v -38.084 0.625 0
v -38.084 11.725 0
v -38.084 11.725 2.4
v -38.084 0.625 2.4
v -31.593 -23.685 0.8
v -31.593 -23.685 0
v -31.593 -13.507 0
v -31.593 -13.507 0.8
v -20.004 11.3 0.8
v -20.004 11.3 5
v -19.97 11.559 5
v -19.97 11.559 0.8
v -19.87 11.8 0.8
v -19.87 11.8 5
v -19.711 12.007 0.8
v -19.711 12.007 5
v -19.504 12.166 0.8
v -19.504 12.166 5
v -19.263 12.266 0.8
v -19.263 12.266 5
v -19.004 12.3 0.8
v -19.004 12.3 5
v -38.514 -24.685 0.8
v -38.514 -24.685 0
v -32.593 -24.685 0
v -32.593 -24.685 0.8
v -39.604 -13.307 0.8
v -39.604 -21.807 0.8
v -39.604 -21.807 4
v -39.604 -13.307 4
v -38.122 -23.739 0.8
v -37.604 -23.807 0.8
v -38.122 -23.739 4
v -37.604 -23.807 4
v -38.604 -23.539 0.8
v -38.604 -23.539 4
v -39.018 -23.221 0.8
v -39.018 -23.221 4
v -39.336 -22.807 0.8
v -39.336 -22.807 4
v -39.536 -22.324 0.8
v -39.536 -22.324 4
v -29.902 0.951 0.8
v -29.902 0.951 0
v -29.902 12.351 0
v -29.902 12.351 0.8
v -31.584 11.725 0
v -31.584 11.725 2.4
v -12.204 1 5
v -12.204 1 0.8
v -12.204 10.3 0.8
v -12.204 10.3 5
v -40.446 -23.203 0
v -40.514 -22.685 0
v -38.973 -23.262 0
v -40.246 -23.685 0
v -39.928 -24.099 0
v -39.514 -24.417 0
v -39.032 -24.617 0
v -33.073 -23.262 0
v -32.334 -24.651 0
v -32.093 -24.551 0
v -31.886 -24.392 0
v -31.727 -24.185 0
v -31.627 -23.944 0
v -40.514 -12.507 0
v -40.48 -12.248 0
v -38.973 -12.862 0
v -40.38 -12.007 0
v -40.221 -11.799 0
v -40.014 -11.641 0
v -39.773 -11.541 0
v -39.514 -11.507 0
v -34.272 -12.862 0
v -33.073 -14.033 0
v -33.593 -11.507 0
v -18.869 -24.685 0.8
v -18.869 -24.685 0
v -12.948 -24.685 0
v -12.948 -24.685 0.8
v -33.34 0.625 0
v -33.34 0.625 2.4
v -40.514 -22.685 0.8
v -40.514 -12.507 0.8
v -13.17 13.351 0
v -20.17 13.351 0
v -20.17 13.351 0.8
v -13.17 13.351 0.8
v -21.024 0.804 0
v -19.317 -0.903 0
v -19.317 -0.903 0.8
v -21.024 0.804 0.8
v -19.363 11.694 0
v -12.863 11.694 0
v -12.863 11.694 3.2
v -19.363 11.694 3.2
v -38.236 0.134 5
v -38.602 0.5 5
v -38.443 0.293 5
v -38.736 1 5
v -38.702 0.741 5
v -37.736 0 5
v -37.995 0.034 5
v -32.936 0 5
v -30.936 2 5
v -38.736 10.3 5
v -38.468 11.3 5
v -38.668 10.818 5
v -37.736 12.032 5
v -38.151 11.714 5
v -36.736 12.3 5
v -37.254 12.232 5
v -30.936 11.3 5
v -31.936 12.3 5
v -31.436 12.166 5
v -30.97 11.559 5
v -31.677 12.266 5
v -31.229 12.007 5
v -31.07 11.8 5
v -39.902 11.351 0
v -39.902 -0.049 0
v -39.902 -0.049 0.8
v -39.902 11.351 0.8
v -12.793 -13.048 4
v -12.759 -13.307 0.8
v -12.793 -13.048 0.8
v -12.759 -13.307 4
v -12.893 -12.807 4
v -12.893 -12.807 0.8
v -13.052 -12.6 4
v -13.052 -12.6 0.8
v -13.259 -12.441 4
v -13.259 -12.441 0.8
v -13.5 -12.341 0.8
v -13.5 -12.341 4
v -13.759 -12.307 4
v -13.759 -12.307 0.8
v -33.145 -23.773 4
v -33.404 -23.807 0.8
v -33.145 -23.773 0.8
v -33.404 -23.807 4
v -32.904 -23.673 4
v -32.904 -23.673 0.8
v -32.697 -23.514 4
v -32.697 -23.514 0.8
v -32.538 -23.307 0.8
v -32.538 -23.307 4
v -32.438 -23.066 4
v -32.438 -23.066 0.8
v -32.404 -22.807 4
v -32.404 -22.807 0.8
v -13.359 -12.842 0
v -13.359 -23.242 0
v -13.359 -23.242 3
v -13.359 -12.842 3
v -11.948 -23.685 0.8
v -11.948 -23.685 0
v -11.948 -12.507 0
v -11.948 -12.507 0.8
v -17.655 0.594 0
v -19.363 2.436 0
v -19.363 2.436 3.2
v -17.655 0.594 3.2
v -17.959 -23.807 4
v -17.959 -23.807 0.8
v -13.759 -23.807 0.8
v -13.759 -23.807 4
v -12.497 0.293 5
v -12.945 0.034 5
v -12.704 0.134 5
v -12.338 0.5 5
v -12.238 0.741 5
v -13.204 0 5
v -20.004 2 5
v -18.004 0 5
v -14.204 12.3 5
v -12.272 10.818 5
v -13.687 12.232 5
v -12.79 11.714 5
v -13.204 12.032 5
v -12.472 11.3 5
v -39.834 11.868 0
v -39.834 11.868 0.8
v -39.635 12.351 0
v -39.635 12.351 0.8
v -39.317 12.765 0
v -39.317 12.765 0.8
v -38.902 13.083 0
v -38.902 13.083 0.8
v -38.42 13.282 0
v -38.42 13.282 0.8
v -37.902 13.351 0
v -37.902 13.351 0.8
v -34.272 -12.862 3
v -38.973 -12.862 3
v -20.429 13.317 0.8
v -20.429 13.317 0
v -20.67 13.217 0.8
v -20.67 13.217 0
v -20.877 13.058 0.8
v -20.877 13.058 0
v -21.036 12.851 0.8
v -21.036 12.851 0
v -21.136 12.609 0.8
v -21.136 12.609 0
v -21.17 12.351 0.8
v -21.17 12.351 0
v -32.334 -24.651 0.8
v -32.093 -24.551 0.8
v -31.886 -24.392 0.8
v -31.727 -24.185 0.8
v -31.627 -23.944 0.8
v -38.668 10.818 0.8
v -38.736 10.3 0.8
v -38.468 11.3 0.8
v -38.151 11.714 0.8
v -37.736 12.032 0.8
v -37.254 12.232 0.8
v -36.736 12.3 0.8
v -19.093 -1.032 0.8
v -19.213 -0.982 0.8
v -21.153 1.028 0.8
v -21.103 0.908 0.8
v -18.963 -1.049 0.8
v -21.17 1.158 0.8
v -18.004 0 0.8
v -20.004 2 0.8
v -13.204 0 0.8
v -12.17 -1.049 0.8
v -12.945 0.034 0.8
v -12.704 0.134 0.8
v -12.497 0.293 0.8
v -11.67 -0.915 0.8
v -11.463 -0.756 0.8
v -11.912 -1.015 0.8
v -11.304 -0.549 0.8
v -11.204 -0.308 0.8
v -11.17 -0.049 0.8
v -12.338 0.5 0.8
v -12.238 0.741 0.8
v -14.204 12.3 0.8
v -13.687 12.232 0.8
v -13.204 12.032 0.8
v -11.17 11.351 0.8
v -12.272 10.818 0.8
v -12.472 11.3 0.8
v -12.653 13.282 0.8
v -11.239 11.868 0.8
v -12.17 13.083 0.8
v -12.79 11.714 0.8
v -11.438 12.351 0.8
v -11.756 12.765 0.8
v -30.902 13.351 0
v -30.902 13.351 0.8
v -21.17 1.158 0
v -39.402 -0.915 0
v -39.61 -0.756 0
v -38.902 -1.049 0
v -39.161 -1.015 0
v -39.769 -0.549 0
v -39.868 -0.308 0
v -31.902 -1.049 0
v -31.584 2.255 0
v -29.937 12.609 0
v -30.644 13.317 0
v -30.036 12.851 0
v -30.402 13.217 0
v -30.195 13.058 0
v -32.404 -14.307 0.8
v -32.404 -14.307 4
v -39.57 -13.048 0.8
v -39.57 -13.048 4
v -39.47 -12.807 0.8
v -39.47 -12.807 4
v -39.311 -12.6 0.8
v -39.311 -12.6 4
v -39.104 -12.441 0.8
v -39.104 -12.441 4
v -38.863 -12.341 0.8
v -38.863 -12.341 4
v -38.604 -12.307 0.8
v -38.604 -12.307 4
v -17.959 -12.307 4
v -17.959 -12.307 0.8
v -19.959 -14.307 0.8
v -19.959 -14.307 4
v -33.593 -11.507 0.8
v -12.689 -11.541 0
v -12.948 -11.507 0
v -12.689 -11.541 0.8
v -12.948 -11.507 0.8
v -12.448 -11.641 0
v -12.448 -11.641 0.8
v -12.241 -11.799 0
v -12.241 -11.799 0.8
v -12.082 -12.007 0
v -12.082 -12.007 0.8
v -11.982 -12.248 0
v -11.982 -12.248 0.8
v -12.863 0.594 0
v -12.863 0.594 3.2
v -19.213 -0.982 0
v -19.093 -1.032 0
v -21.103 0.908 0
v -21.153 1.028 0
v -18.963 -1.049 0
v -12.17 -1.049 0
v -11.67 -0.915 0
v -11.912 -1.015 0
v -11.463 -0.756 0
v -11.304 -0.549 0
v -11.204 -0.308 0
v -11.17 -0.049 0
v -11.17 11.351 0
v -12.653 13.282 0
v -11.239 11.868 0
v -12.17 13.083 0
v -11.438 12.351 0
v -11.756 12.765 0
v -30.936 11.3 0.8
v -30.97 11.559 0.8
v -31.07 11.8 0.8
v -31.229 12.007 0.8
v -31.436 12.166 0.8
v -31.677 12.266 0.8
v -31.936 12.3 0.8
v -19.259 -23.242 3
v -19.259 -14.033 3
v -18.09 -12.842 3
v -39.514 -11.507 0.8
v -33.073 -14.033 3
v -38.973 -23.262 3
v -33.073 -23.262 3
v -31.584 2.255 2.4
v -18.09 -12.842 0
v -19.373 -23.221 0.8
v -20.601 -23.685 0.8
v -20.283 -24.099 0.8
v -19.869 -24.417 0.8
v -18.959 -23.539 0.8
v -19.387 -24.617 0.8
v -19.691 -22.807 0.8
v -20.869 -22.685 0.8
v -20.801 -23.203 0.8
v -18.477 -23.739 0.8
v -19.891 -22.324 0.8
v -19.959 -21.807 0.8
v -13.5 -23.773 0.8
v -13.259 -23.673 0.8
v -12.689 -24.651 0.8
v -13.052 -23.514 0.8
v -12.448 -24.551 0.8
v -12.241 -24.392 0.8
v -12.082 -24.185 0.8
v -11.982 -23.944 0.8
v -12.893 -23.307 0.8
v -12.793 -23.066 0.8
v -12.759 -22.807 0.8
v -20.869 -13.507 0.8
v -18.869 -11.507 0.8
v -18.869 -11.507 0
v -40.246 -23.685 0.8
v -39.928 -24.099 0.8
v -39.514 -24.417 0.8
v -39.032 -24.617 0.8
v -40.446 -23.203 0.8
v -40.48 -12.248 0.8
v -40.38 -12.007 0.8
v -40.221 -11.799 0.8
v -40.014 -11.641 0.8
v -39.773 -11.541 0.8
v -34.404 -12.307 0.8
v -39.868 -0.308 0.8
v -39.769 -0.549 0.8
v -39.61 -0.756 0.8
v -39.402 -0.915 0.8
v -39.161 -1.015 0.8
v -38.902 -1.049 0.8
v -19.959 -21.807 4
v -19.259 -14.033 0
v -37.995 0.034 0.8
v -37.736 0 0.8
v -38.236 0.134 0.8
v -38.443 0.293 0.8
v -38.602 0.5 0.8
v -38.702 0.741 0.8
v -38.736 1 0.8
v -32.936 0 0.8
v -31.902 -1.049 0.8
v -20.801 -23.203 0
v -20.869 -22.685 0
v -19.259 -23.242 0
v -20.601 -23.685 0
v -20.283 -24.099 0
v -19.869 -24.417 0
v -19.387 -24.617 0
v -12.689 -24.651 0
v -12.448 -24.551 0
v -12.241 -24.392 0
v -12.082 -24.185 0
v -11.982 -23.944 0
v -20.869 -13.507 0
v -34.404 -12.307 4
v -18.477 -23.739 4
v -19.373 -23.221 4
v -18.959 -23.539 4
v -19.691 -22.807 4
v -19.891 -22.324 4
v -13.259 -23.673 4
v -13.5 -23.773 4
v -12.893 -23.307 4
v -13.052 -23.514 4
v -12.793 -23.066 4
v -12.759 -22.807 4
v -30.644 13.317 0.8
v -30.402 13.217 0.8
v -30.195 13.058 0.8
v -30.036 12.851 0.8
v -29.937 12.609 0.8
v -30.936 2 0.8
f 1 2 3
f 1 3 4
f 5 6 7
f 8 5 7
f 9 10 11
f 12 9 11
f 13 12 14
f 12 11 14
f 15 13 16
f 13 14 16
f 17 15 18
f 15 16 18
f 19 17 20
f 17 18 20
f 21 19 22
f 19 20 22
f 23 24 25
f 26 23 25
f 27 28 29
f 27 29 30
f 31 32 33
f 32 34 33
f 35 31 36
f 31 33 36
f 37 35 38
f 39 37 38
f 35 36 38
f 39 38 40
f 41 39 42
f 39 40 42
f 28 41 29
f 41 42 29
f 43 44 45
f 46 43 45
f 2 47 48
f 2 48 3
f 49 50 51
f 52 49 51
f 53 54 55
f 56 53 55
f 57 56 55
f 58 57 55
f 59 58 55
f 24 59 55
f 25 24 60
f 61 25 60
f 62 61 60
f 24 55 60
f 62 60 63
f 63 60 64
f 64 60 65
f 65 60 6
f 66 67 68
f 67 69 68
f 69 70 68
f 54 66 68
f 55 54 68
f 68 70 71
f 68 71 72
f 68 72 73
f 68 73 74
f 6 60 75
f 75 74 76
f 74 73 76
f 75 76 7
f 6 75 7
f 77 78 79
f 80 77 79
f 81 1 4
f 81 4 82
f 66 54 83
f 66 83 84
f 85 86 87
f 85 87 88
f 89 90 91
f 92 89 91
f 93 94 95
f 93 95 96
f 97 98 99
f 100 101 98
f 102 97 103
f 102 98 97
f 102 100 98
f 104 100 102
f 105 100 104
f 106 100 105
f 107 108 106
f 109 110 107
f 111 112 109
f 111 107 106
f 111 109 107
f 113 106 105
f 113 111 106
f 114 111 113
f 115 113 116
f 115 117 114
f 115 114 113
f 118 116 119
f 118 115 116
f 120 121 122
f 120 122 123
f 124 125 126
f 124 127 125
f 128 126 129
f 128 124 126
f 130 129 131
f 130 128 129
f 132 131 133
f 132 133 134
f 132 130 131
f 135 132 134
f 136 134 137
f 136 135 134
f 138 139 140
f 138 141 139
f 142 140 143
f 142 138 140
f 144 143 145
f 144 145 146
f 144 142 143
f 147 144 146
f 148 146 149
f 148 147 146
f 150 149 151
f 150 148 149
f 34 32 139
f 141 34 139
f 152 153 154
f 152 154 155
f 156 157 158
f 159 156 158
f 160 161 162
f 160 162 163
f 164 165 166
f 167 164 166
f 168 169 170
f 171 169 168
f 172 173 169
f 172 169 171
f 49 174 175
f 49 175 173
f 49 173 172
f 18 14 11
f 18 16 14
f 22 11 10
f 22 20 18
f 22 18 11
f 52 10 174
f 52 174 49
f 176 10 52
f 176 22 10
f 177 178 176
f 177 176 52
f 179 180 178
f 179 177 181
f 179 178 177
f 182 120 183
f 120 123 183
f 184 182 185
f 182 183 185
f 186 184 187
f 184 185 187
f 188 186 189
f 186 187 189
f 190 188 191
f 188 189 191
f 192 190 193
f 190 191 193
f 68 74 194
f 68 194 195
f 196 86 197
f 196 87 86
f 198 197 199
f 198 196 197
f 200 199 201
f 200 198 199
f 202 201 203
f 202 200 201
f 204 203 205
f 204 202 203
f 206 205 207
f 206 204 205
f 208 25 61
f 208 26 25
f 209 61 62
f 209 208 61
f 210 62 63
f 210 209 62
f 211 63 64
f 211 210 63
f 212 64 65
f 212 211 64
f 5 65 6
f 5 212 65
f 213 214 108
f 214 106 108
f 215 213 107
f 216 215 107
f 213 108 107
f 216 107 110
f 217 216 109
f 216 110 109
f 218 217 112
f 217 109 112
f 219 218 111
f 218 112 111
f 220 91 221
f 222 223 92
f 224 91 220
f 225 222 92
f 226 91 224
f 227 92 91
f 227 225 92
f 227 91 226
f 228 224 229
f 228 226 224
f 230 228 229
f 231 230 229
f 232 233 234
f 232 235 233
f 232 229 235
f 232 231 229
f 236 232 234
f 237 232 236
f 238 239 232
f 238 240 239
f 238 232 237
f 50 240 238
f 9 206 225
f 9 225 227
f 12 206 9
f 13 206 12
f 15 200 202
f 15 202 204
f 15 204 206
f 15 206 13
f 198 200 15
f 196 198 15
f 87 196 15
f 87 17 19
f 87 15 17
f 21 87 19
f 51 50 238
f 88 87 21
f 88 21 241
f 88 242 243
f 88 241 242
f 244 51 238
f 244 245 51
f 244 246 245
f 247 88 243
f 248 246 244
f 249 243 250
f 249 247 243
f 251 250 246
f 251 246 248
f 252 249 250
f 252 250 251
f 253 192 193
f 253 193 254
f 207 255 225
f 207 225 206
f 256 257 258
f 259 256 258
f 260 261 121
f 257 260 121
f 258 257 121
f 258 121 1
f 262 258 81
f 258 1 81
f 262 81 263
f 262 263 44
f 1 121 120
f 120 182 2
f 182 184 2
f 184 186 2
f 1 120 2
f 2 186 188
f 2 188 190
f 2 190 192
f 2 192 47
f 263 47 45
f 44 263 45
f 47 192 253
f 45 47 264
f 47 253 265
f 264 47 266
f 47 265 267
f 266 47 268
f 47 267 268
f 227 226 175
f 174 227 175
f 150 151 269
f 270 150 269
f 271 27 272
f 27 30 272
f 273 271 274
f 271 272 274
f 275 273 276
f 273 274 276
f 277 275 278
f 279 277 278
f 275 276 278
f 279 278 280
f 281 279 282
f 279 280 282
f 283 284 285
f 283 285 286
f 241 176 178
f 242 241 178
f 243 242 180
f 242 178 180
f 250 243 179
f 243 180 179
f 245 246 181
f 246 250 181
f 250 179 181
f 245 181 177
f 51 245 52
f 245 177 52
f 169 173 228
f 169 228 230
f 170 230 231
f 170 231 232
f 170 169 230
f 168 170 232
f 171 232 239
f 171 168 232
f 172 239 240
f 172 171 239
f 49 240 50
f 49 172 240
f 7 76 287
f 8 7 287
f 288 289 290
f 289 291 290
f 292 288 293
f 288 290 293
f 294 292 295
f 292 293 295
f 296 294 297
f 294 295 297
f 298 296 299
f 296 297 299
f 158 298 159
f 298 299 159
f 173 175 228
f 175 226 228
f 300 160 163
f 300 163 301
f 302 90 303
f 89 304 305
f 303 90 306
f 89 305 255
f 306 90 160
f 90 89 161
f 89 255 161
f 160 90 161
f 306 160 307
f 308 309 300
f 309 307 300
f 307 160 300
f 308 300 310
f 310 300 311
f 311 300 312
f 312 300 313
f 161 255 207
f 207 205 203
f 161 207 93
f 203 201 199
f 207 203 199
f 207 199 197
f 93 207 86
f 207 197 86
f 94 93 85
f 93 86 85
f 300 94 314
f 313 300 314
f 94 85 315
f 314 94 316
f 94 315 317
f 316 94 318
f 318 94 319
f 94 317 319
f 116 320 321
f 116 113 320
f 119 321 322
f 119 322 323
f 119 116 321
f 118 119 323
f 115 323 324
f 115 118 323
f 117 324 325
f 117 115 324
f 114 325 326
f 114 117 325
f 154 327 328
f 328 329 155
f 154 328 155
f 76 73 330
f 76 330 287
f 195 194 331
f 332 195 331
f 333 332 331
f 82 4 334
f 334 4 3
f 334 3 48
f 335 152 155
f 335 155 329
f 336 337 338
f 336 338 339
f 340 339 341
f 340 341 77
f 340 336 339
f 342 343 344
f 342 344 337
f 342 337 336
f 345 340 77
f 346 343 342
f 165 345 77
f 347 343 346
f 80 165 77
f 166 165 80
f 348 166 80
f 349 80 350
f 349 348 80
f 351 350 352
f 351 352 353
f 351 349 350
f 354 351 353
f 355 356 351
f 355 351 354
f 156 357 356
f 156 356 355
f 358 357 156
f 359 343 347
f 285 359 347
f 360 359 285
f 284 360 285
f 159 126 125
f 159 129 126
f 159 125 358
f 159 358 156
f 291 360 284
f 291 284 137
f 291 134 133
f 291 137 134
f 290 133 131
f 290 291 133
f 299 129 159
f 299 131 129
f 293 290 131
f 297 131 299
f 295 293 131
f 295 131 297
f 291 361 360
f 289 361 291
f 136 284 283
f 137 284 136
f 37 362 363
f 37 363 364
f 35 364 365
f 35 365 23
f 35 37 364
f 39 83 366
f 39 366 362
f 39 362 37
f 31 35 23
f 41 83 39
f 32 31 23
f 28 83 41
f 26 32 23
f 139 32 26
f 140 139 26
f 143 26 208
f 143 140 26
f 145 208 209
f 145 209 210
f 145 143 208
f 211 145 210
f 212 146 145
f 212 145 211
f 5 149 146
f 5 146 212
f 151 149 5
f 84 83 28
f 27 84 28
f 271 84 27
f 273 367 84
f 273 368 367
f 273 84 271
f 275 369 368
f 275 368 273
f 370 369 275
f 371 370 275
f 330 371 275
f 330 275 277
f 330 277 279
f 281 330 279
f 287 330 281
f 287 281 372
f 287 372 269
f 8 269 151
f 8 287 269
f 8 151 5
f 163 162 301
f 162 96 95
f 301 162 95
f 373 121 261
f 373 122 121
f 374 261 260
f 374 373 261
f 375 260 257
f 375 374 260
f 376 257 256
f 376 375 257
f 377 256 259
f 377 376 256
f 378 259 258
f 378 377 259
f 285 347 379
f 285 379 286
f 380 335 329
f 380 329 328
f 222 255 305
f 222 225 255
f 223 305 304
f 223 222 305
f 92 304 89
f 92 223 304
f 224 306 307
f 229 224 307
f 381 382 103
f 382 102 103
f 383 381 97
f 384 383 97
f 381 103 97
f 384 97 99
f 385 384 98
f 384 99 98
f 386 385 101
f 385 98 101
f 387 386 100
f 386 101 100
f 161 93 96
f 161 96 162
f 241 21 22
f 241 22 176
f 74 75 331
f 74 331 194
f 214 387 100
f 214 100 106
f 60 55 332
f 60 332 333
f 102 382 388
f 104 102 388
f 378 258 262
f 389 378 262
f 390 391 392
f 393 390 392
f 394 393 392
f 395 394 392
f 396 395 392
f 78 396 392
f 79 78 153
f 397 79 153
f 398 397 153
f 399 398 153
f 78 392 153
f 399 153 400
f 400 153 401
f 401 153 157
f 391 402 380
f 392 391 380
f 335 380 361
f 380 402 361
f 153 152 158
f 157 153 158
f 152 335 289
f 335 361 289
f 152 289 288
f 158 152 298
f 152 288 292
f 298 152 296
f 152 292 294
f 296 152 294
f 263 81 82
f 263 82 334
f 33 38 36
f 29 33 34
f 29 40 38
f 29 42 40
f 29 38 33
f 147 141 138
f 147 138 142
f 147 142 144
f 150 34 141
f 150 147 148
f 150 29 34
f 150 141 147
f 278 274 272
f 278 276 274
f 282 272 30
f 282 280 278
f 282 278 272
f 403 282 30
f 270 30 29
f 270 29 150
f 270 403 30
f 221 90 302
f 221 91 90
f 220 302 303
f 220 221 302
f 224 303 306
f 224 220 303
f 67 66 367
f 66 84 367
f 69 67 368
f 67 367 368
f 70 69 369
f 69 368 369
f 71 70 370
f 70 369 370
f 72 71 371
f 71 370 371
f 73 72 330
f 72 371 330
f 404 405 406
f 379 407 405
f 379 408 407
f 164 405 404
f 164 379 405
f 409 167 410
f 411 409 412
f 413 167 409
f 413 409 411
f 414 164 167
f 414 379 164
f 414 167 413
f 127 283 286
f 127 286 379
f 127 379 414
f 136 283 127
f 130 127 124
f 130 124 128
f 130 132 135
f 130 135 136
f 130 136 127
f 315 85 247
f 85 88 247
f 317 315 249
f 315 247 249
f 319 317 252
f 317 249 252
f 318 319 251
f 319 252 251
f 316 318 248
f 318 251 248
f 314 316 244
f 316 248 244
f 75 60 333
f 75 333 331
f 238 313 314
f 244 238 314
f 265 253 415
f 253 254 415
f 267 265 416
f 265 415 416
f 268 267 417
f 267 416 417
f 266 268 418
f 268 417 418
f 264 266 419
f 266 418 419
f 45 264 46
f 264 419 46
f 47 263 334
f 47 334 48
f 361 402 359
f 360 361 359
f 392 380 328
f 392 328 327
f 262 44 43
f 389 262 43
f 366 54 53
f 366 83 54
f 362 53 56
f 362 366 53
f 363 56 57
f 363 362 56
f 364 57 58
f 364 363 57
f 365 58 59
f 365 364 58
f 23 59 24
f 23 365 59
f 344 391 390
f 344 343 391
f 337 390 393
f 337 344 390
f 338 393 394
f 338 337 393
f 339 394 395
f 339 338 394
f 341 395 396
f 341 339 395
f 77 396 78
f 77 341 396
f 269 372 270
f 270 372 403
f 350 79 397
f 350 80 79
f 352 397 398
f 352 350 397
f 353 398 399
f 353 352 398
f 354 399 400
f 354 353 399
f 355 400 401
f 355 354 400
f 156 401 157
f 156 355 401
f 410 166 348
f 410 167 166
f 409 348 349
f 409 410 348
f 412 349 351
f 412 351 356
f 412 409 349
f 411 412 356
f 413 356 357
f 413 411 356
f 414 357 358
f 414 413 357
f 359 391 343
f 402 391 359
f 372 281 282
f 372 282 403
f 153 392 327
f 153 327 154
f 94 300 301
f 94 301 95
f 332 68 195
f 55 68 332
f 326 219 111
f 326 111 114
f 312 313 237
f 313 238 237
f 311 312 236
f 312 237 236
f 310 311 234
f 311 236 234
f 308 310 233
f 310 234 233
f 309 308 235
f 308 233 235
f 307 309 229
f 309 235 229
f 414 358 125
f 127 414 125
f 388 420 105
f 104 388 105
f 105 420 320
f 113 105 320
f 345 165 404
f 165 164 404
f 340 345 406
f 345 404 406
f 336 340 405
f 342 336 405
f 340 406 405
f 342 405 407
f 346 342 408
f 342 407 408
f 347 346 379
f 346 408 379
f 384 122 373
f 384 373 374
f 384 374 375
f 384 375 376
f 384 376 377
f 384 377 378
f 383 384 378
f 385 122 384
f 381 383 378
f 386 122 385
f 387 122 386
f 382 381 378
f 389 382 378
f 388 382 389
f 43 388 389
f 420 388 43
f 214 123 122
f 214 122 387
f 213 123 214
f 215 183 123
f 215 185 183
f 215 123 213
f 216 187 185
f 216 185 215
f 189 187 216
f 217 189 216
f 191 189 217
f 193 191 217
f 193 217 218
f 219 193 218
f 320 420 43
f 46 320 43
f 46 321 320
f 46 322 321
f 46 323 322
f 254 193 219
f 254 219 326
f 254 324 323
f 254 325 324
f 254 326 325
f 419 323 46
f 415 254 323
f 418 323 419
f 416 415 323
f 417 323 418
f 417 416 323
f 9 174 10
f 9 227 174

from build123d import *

# Parameters (mm, degrees)
F0_W       = 7.8
F0_H       = 12.3
F1_DEPTH   = 5
F0_W_2     = 10
F0_H_2     = 14.4
F2_DEPTH   = 0.8
F3_R       = 1
F3_2_R     = 1
F4_R       = 2
F4_2_R     = 2
F5_DEPTH   = 0.8
F6_SIZE    = 2
F6_2_SIZE  = 2
F7_R       = 0.5
F8_R       = 2
F9_R       = 1
F10_W      = 7.2
F10_H      = 11.5
F11_DEPTH  = 4
F10_W_2    = 8.9209638536
F10_H_2    = 13.1787001155
F12_DEPTH  = 0.8
F13_R      = 2
F13_2_R    = 2
F14_R      = 1
F14_2_R    = 1
F15_DEPTH  = 3.2
F16_DEPTH  = 2.4
F17_DEPTH  = 3
F18_DEPTH  = 3
F19_SIZE   = 2
F19_2_SIZE = 2


with BuildPart() as f1:
    # F0 (on Top) → F1 (new body)
    with BuildSketch(Plane.XY):
        with Locations((-34.8363173068, 6.15)):
            Rectangle(F0_W, F0_H)
        Polygon((-38.0835977137, 0.6249411381), (-38.0835977137, 11.7249411381), (-31.5835977137, 11.7249411381), (-31.5835977137, 2.2546383552), (-31.5835977137, 0.6249411381), (-33.3403423429, 0.6249411381), align=None, mode=Mode.SUBTRACT)
        Polygon((-31.5835977137, 11.7249411381), (-38.0835977137, 11.7249411381), (-38.0835977137, 0.6249411381), (-33.3403423429, 0.6249411381), (-31.5835977137, 2.2546383552), align=None)
        Polygon((-31.5835977137, 0.6249411381), (-31.5835977137, 2.2546383552), (-33.3403423429, 0.6249411381), align=None)
    extrude(amount=F1_DEPTH)

    # F0 (on Top) → F2 (join)
    with BuildSketch(Plane.XY):
        with Locations((-34.9024849355, 6.1506106358)):
            Rectangle(F0_W_2, F0_H_2)
        with Locations((-34.8363173068, 6.15)):
            Rectangle(F0_W, F0_H, mode=Mode.SUBTRACT)
    extrude(amount=F2_DEPTH)

    # F3
    f3_edges = [f1.edges().sort_by_distance(p)[0] for p in [
        (-38.736317, 0, 2.9),
        (-39.902485, -1.049389, 0.4),
        (-29.902485, 13.350611, 0.4),
        (-30.936317, 12.3, 2.9),
    ]]
    fillet(f3_edges, radius=F3_R)

    # F4
    f4_edges = [f1.edges().sort_by_distance(p)[0] for p in [
        (-39.902485, 13.350611, 0.4),
        (-38.736317, 12.3, 2.9),
    ]]
    fillet(f4_edges, radius=F4_R)

    # F6
    f6_edges = [f1.edges().sort_by_distance(p)[0] for p in [
        (-29.902485, -1.049389, 0.4),
        (-30.936317, 0, 2.9),
    ]]
    chamfer(f6_edges, length=F6_SIZE)

    # F0 (on Top) → F16 (cut)
    with BuildSketch(Plane.XY):
        Polygon((-31.5835977137, 11.7249411381), (-38.0835977137, 11.7249411381), (-38.0835977137, 0.6249411381), (-33.3403423429, 0.6249411381), (-31.5835977137, 2.2546383552), align=None)
    extrude(amount=F16_DEPTH, mode=Mode.SUBTRACT)


with BuildPart() as f1b:
    # F0 (on Top) → F1, piece 2 (new body)
    with BuildSketch(Plane.XY):
        with Locations((-16.1042231411, 6.15)):
            Rectangle(F0_W, F0_H)
        Polygon((-19.3634564057, 2.4356972507), (-19.3634564057, 11.6938437534), (-12.8634564057, 11.6938437534), (-12.8634564057, 0.5938437534), (-17.6548053763, 0.5938437534), (-19.3634564057, 0.5938437534), align=None, mode=Mode.SUBTRACT)
        Polygon((-12.8634564057, 11.6938437534), (-19.3634564057, 11.6938437534), (-19.3634564057, 2.4356972507), (-17.6548053763, 0.5938437534), (-12.8634564057, 0.5938437534), align=None)
        Polygon((-17.6548053763, 0.5938437534), (-19.3634564057, 2.4356972507), (-19.3634564057, 0.5938437534), align=None)
    extrude(amount=F1_DEPTH)

    # F3#2
    f3_2_edges = [f1b.edges().sort_by_distance(p)[0] for p in [
        (-12.204223, 0, 2.5),
        (-20.004223, 12.3, 2.5),
    ]]
    fillet(f3_2_edges, radius=F3_2_R)

    # F4#2
    f4_2_edges = [f1b.edges().sort_by_distance(p)[0] for p in [
        (-12.204223, 12.3, 2.5),
    ]]
    fillet(f4_2_edges, radius=F4_2_R)

    # F0 (on Top) → F5 (join)
    with BuildSketch(Plane.XY):
        with Locations((-16.1703907698, 6.1506106358)):
            Rectangle(F0_W_2, F0_H_2)
        with Locations((-16.1042231411, 6.15)):
            Rectangle(F0_W, F0_H, mode=Mode.SUBTRACT)
        with Locations((-16.1042231411, 6.15)):
            Rectangle(F0_W, F0_H)
        Polygon((-19.3634564057, 2.4356972507), (-19.3634564057, 11.6938437534), (-12.8634564057, 11.6938437534), (-12.8634564057, 0.5938437534), (-17.6548053763, 0.5938437534), (-19.3634564057, 0.5938437534), align=None, mode=Mode.SUBTRACT)
        Polygon((-12.8634564057, 11.6938437534), (-19.3634564057, 11.6938437534), (-19.3634564057, 2.4356972507), (-17.6548053763, 0.5938437534), (-12.8634564057, 0.5938437534), align=None)
    extrude(amount=F5_DEPTH)

    # F6#2
    f6_2_edges = [f1b.edges().sort_by_distance(p)[0] for p in [
        (-21.170391, -1.049389, 0.4),
        (-20.004223, 0, 2.9),
    ]]
    chamfer(f6_2_edges, length=F6_2_SIZE)

    # F7
    f7_edges = [f1b.edges().sort_by_distance(p)[0] for p in [
        (-21.170391, 0.950611, 0.4),
        (-19.170391, -1.049389, 0.4),
    ]]
    fillet(f7_edges, radius=F7_R)

    # F8
    f8_edges = [f1b.edges().sort_by_distance(p)[0] for p in [
        (-11.170391, 13.350611, 0.4),
    ]]
    fillet(f8_edges, radius=F8_R)

    # F9
    f9_edges = [f1b.edges().sort_by_distance(p)[0] for p in [
        (-11.170391, -1.049389, 0.4),
        (-21.170391, 13.350611, 0.4),
    ]]
    fillet(f9_edges, radius=F9_R)

    # F0 (on Top) → F15 (cut)
    with BuildSketch(Plane.XY):
        Polygon((-12.8634564057, 11.6938437534), (-19.3634564057, 11.6938437534), (-19.3634564057, 2.4356972507), (-17.6548053763, 0.5938437534), (-12.8634564057, 0.5938437534), align=None)
    extrude(amount=F15_DEPTH, mode=Mode.SUBTRACT)


with BuildPart() as f11:
    # F10 (on Top) → F11 (new body)
    with BuildSketch(Plane.XY):
        with Locations((-36.0041396379, -18.056700483)):
            Rectangle(F10_W, F10_H)
        Polygon((-38.9729559064, -23.2622586191), (-38.9729559064, -12.8622586191), (-34.2715643346, -12.8622586191), (-33.0729559064, -12.8622586191), (-33.0729559064, -14.0329562128), (-33.0729559064, -23.2622586191), align=None, mode=Mode.SUBTRACT)
        Polygon((-34.2715643346, -12.8622586191), (-38.9729559064, -12.8622586191), (-38.9729559064, -23.2622586191), (-33.0729559064, -23.2622586191), (-33.0729559064, -14.0329562128), align=None)
        Polygon((-33.0729559064, -12.8622586191), (-34.2715643346, -12.8622586191), (-33.0729559064, -14.0329562128), align=None)
    extrude(amount=F11_DEPTH)

    # F10 (on Top) → F12 (join)
    with BuildSketch(Plane.XY):
        with Locations((-36.0536258668, -18.0959303398)):
            Rectangle(F10_W_2, F10_H_2)
        with Locations((-36.0041396379, -18.056700483)):
            Rectangle(F10_W, F10_H, mode=Mode.SUBTRACT)
        with Locations((-36.0041396379, -18.056700483)):
            Rectangle(F10_W, F10_H)
        Polygon((-38.9729559064, -23.2622586191), (-38.9729559064, -12.8622586191), (-34.2715643346, -12.8622586191), (-33.0729559064, -12.8622586191), (-33.0729559064, -14.0329562128), (-33.0729559064, -23.2622586191), align=None, mode=Mode.SUBTRACT)
    extrude(amount=F12_DEPTH)

    # F13
    f13_edges = [f11.edges().sort_by_distance(p)[0] for p in [
        (-39.60414, -23.8067, 2.4),
        (-40.514108, -24.68528, 0.4),
    ]]
    fillet(f13_edges, radius=F13_R)

    # F14
    f14_edges = [f11.edges().sort_by_distance(p)[0] for p in [
        (-32.40414, -23.8067, 2.4),
        (-31.593144, -24.68528, 0.4),
        (-39.60414, -12.3067, 2.4),
        (-40.514108, -11.50658, 0.4),
    ]]
    fillet(f14_edges, radius=F14_R)

    # F10 (on Top) → F17 (cut)
    with BuildSketch(Plane.XY):
        Polygon((-34.2715643346, -12.8622586191), (-38.9729559064, -12.8622586191), (-38.9729559064, -23.2622586191), (-33.0729559064, -23.2622586191), (-33.0729559064, -14.0329562128), align=None)
    extrude(amount=F17_DEPTH, mode=Mode.SUBTRACT)

    # F19
    f19_edges = [f11.edges().sort_by_distance(p)[0] for p in [
        (-32.40414, -12.3067, 2.4),
        (-31.593144, -11.50658, 0.4),
    ]]
    chamfer(f19_edges, length=F19_SIZE)


with BuildPart() as f11b:
    # F10 (on Top) → F11, piece 2 (new body)
    with BuildSketch(Plane.XY):
        with Locations((-16.3590158954, -18.056700483)):
            Rectangle(F10_W, F10_H)
        Polygon((-19.2590169609, -14.0329562128), (-19.2590169609, -12.8423916459), (-18.0903207511, -12.8423916459), (-13.3590169609, -12.8423916459), (-13.3590169609, -23.2423916459), (-19.2590169609, -23.2423916459), align=None, mode=Mode.SUBTRACT)
        Polygon((-18.0903207511, -12.8423916459), (-19.2590169609, -12.8423916459), (-19.2590169609, -14.0329562128), align=None)
        Polygon((-13.3590169609, -12.8423916459), (-18.0903207511, -12.8423916459), (-19.2590169609, -14.0329562128), (-19.2590169609, -23.2423916459), (-13.3590169609, -23.2423916459), align=None)
    extrude(amount=F11_DEPTH)

    # F10 (on Top) → F12, piece 2 (join)
    with BuildSketch(Plane.XY):
        with Locations((-16.4085021242, -18.0959303398)):
            Rectangle(F10_W_2, F10_H_2)
        with Locations((-16.3590158954, -18.056700483)):
            Rectangle(F10_W, F10_H, mode=Mode.SUBTRACT)
        with Locations((-16.3590158954, -18.056700483)):
            Rectangle(F10_W, F10_H)
        Polygon((-19.2590169609, -14.0329562128), (-19.2590169609, -12.8423916459), (-18.0903207511, -12.8423916459), (-13.3590169609, -12.8423916459), (-13.3590169609, -23.2423916459), (-19.2590169609, -23.2423916459), align=None, mode=Mode.SUBTRACT)
    extrude(amount=F12_DEPTH)

    # F13#2
    f13_2_edges = [f11b.edges().sort_by_distance(p)[0] for p in [
        (-19.959016, -23.8067, 2.4),
        (-20.868984, -24.68528, 0.4),
    ]]
    fillet(f13_2_edges, radius=F13_2_R)

    # F14#2
    f14_2_edges = [f11b.edges().sort_by_distance(p)[0] for p in [
        (-12.759016, -23.8067, 2.4),
        (-11.94802, -24.68528, 0.4),
        (-12.759016, -12.3067, 2.4),
        (-11.94802, -11.50658, 0.4),
    ]]
    fillet(f14_2_edges, radius=F14_2_R)

    # F10 (on Top) → F18 (cut)
    with BuildSketch(Plane.XY):
        Polygon((-13.3590169609, -12.8423916459), (-18.0903207511, -12.8423916459), (-19.2590169609, -14.0329562128), (-19.2590169609, -23.2423916459), (-13.3590169609, -23.2423916459), align=None)
    extrude(amount=F18_DEPTH, mode=Mode.SUBTRACT)

    # F19#2
    f19_2_edges = [f11b.edges().sort_by_distance(p)[0] for p in [
        (-19.959016, -12.3067, 2.4),
        (-20.868984, -11.50658, 0.4),
    ]]
    chamfer(f19_2_edges, length=F19_2_SIZE)


solid = Compound([f1.part, f1b.part, f11.part, f11b.part])
